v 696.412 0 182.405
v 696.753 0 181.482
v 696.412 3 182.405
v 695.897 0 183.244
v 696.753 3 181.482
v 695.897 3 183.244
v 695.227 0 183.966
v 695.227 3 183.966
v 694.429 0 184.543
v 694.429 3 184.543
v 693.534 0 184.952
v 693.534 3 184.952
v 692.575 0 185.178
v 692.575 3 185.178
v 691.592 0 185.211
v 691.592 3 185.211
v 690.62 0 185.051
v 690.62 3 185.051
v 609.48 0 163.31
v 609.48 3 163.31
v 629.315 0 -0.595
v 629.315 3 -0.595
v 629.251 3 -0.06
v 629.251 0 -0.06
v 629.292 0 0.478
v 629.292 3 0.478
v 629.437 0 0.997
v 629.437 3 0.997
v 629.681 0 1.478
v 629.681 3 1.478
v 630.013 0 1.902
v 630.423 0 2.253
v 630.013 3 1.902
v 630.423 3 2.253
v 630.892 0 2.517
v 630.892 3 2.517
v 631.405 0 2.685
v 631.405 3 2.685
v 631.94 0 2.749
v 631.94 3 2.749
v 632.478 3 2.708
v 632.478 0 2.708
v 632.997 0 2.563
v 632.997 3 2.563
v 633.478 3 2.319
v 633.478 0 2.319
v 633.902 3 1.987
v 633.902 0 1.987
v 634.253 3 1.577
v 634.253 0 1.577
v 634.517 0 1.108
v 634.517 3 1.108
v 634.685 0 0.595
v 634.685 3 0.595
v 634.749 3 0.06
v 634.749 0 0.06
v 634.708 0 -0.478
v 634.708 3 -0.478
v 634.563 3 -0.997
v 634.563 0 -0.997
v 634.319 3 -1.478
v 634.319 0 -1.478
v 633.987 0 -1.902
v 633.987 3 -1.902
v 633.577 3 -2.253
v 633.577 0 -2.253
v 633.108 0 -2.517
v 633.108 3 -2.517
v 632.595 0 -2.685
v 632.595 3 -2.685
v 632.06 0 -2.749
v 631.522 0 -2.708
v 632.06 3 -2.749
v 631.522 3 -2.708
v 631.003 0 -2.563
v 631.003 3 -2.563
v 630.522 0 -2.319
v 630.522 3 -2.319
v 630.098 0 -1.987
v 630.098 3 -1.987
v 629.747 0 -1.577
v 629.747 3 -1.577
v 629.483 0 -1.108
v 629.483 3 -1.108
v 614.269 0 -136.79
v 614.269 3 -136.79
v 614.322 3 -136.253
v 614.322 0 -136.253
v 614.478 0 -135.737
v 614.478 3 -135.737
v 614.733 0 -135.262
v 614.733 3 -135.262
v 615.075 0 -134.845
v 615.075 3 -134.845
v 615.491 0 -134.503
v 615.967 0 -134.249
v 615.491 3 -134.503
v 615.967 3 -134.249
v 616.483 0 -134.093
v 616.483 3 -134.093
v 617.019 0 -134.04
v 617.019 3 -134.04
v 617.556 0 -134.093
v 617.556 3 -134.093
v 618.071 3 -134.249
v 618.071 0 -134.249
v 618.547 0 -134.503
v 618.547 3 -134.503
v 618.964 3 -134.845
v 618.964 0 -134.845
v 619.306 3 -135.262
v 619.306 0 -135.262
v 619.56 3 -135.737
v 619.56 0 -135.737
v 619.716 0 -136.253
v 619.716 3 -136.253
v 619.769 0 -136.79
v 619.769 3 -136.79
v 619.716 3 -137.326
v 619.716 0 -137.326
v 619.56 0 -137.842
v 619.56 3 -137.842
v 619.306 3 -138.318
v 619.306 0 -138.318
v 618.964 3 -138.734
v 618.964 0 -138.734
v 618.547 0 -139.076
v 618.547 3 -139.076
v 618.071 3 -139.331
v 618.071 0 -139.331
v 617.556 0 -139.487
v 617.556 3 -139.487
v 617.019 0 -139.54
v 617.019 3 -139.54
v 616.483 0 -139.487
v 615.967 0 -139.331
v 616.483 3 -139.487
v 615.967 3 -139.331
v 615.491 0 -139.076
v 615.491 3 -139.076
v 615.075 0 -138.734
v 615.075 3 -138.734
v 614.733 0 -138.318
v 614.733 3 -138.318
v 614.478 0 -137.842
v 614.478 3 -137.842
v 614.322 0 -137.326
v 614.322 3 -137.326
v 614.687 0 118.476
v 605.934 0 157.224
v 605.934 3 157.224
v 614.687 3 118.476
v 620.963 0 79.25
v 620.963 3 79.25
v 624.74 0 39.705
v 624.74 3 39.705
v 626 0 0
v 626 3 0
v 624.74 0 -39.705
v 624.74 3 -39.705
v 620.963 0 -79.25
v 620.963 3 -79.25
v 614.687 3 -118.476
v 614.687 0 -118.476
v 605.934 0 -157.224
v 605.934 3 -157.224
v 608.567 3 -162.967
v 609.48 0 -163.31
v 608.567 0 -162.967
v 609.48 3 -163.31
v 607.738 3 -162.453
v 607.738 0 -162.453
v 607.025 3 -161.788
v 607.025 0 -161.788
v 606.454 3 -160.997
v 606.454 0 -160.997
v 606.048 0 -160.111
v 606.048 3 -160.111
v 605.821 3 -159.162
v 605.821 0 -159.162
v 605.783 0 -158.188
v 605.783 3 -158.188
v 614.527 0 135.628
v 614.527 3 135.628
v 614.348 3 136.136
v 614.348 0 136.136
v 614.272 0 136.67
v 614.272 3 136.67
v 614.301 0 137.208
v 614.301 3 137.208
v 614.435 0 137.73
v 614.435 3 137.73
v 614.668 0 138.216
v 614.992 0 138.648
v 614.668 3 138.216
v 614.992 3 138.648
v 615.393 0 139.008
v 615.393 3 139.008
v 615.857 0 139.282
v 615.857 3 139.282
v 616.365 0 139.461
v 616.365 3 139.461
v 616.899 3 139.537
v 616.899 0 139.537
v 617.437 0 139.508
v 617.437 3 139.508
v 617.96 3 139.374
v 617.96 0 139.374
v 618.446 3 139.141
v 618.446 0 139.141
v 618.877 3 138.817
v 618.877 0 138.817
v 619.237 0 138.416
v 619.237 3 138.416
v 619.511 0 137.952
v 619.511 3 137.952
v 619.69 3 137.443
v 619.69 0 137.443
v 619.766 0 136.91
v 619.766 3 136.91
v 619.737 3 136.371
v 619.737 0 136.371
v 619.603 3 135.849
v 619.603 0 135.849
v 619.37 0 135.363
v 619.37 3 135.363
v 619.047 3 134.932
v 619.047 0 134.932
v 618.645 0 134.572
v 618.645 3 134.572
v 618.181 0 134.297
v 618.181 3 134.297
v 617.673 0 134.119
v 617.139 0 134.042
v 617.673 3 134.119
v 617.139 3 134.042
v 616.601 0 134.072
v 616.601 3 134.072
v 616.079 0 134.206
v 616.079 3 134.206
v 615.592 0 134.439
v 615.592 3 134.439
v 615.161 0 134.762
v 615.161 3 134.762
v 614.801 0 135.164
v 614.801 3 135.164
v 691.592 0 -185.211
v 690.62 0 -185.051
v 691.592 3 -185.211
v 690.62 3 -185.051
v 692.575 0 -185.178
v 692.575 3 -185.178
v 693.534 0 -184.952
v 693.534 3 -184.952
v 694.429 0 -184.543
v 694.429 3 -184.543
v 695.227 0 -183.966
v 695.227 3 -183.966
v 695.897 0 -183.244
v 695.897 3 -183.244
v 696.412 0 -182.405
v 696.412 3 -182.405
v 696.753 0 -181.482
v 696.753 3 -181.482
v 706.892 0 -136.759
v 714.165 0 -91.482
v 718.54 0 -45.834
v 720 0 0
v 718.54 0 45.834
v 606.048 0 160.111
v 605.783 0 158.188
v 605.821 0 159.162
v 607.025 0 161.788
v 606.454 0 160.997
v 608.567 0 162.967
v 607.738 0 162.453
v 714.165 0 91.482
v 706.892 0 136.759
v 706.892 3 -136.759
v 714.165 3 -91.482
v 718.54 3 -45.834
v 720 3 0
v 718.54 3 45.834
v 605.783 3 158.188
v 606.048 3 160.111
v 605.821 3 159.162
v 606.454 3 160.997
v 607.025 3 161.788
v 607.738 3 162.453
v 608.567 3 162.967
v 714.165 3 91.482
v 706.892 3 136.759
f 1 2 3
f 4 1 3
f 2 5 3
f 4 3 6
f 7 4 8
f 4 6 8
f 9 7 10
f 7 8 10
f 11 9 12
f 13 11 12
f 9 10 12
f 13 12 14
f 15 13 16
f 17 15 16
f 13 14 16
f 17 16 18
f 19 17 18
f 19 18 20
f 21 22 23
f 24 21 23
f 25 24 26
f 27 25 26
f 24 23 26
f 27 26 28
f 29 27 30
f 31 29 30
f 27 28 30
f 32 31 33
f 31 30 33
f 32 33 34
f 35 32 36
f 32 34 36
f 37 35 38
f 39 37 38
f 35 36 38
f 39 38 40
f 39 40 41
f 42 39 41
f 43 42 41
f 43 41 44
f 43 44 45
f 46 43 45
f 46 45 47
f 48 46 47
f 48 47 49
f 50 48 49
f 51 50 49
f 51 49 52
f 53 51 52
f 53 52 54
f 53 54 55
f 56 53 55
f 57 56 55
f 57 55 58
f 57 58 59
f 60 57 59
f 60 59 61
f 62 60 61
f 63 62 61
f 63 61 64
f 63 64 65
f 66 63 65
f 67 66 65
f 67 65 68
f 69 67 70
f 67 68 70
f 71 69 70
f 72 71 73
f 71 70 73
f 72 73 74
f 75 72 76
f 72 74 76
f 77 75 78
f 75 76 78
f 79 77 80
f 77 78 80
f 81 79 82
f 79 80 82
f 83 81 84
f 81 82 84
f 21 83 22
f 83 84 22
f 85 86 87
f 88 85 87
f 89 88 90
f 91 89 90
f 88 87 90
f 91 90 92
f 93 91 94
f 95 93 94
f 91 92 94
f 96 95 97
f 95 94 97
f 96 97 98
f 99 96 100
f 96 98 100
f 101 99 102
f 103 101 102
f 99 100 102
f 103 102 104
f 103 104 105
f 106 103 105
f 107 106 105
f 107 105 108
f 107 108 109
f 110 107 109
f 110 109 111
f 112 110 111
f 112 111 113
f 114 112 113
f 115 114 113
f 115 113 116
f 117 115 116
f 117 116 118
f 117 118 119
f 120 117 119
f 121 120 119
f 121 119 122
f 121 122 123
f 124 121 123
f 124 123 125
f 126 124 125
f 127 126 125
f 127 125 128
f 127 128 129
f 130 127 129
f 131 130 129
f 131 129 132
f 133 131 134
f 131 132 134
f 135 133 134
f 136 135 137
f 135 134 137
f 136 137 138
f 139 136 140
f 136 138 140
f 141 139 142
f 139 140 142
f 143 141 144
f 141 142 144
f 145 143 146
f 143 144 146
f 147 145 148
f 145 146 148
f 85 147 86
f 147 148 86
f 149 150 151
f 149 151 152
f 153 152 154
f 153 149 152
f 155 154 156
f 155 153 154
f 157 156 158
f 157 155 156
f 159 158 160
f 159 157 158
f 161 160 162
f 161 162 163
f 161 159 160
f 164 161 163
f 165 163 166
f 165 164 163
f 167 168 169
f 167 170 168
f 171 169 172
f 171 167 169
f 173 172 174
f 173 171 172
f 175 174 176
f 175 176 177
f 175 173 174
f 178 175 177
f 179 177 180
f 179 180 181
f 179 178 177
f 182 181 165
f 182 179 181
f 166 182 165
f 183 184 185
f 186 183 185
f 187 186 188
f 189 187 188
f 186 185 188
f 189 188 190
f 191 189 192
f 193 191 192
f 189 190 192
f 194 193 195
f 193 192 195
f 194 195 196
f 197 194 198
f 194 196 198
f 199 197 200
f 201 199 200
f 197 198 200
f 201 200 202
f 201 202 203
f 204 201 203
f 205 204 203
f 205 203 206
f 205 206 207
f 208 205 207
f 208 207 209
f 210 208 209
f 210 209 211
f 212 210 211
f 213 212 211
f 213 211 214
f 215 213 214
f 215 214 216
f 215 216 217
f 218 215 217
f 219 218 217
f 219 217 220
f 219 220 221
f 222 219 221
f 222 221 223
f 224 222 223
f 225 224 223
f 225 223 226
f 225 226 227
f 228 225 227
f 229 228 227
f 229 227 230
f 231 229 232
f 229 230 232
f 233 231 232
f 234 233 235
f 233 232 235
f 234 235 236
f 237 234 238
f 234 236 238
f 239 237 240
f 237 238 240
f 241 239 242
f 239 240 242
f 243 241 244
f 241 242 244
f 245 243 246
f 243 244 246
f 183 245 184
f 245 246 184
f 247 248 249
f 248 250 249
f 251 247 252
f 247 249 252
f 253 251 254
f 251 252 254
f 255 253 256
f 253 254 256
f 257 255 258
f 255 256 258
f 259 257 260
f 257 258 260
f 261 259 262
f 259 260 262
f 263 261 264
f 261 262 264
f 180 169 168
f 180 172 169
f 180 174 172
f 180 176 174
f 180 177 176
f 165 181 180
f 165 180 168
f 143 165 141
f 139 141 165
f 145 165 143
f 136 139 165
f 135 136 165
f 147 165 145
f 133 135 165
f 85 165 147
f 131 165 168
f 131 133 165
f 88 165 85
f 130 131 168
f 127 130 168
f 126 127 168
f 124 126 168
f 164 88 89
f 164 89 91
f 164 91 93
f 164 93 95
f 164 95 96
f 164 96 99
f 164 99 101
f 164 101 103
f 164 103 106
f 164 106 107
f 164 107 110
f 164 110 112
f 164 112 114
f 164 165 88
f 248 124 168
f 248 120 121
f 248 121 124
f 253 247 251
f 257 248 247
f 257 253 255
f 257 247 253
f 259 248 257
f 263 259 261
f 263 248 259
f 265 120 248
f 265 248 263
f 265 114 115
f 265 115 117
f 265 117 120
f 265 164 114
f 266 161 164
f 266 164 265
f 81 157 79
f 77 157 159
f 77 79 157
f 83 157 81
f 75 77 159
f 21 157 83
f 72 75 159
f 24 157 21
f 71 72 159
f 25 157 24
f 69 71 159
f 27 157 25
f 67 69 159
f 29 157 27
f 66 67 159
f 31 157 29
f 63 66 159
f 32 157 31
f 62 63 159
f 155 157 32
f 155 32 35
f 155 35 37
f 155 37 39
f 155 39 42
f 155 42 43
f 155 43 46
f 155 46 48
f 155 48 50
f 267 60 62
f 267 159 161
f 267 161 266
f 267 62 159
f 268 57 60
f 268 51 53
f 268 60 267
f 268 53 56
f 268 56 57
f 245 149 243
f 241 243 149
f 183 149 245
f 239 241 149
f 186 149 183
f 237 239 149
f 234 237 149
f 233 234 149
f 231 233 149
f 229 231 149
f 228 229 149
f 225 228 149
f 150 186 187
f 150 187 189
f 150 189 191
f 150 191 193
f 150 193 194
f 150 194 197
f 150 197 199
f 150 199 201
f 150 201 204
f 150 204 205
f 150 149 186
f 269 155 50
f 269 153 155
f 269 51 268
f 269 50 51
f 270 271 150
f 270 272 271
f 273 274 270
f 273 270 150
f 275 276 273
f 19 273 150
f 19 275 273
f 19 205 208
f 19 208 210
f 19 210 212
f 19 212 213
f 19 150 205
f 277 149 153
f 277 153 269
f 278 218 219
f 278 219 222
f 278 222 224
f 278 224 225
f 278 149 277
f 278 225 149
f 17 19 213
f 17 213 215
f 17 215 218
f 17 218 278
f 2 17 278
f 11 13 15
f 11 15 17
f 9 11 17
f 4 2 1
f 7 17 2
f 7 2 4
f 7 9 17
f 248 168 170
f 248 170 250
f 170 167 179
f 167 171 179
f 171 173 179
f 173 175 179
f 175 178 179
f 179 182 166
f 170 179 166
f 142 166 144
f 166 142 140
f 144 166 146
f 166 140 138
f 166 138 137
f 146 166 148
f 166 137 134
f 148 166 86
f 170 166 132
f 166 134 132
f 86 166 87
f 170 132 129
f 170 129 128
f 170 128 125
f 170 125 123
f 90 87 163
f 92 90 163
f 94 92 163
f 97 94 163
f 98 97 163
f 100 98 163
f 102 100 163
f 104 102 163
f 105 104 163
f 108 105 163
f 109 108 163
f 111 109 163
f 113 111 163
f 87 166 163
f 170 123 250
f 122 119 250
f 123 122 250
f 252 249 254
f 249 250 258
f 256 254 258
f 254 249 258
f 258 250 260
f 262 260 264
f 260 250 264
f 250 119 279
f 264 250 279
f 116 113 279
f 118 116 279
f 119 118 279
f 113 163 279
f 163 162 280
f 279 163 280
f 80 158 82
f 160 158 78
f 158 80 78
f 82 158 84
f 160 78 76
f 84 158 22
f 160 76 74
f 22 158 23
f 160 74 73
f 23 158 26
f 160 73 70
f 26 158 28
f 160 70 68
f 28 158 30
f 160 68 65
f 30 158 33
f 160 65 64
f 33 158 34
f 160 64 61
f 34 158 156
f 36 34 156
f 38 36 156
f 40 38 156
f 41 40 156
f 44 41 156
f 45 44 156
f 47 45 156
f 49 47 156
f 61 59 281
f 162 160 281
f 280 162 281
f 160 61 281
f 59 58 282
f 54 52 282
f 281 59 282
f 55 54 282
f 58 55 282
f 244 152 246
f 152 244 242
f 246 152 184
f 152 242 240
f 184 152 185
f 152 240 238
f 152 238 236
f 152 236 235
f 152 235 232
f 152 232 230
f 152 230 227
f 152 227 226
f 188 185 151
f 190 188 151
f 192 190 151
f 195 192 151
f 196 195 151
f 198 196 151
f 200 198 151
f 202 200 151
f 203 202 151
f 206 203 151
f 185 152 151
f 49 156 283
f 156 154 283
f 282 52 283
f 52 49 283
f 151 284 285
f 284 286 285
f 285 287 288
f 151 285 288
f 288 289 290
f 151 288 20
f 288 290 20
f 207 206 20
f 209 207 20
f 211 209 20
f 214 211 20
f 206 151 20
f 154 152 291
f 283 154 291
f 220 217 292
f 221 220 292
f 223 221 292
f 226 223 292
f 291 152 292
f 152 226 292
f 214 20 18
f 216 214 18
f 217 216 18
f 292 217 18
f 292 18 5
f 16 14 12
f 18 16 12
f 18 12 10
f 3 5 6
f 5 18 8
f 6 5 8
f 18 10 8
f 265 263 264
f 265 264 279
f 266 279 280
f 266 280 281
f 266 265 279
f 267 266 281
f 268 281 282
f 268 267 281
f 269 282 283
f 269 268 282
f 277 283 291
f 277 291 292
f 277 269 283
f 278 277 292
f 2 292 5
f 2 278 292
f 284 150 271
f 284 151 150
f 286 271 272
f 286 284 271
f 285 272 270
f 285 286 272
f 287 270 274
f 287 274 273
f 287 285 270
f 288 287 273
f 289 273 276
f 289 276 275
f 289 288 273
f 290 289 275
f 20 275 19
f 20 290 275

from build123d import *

# Parameters (mm, degrees)
F2_DEPTH        = 3
F4_D            = 5.5
F4_COPIES_COUNT = 3
F4_COPIES_ANGLE = 25
F5_R            = 5


# Not quite as in the source:
# - a pattern or mirror of a feature is missing from the dataset's text; its kind, count and spacing are read off the source's solid


with BuildPart() as f2:
    # F1 (on Front) → F2 (new body)
    with BuildSketch(Plane.XZ):
        with BuildLine():
            Line((604.669567257, -162.0207222342), (695.4665949281, -186.3497124738))
            ThreePointArc((695.4665949281, -186.3497124738), (720, 0), (695.4665949281, 186.3497124738))
            Line((695.4665949281, 186.3497124738), (604.669567257, 162.0207222342))
            ThreePointArc((604.669567257, 162.0207222342), (626, 0), (604.669567257, -162.0207222342))
        make_face()
    extrude(amount=-F2_DEPTH)

    # F4 (through all)
    with Locations(Plane.XZ):
        with Locations((617.0190764998, -136.7898360089)):
            f4 = Hole(F4_D / 2)

    # F4_copies: F4 ×3 about axis
    f4_copies_axis = Axis((0, 0, 0), (0, -1, 0))
    for i in range(1, F4_COPIES_COUNT):
        add(f4.rotate(f4_copies_axis, i * F4_COPIES_ANGLE / (F4_COPIES_COUNT - 1)), mode=Mode.SUBTRACT)

    # F5
    f5_edges = [f2.edges().sort_by_distance(p)[0] for p in [
        (695.466595, 1.5, 186.349712),
        (604.669567, 1.5, 162.020722),
        (695.466595, 1.5, -186.349712),
        (604.669567, 1.5, -162.020722),
    ]]
    fillet(f5_edges, radius=F5_R)


solid = f2.part
